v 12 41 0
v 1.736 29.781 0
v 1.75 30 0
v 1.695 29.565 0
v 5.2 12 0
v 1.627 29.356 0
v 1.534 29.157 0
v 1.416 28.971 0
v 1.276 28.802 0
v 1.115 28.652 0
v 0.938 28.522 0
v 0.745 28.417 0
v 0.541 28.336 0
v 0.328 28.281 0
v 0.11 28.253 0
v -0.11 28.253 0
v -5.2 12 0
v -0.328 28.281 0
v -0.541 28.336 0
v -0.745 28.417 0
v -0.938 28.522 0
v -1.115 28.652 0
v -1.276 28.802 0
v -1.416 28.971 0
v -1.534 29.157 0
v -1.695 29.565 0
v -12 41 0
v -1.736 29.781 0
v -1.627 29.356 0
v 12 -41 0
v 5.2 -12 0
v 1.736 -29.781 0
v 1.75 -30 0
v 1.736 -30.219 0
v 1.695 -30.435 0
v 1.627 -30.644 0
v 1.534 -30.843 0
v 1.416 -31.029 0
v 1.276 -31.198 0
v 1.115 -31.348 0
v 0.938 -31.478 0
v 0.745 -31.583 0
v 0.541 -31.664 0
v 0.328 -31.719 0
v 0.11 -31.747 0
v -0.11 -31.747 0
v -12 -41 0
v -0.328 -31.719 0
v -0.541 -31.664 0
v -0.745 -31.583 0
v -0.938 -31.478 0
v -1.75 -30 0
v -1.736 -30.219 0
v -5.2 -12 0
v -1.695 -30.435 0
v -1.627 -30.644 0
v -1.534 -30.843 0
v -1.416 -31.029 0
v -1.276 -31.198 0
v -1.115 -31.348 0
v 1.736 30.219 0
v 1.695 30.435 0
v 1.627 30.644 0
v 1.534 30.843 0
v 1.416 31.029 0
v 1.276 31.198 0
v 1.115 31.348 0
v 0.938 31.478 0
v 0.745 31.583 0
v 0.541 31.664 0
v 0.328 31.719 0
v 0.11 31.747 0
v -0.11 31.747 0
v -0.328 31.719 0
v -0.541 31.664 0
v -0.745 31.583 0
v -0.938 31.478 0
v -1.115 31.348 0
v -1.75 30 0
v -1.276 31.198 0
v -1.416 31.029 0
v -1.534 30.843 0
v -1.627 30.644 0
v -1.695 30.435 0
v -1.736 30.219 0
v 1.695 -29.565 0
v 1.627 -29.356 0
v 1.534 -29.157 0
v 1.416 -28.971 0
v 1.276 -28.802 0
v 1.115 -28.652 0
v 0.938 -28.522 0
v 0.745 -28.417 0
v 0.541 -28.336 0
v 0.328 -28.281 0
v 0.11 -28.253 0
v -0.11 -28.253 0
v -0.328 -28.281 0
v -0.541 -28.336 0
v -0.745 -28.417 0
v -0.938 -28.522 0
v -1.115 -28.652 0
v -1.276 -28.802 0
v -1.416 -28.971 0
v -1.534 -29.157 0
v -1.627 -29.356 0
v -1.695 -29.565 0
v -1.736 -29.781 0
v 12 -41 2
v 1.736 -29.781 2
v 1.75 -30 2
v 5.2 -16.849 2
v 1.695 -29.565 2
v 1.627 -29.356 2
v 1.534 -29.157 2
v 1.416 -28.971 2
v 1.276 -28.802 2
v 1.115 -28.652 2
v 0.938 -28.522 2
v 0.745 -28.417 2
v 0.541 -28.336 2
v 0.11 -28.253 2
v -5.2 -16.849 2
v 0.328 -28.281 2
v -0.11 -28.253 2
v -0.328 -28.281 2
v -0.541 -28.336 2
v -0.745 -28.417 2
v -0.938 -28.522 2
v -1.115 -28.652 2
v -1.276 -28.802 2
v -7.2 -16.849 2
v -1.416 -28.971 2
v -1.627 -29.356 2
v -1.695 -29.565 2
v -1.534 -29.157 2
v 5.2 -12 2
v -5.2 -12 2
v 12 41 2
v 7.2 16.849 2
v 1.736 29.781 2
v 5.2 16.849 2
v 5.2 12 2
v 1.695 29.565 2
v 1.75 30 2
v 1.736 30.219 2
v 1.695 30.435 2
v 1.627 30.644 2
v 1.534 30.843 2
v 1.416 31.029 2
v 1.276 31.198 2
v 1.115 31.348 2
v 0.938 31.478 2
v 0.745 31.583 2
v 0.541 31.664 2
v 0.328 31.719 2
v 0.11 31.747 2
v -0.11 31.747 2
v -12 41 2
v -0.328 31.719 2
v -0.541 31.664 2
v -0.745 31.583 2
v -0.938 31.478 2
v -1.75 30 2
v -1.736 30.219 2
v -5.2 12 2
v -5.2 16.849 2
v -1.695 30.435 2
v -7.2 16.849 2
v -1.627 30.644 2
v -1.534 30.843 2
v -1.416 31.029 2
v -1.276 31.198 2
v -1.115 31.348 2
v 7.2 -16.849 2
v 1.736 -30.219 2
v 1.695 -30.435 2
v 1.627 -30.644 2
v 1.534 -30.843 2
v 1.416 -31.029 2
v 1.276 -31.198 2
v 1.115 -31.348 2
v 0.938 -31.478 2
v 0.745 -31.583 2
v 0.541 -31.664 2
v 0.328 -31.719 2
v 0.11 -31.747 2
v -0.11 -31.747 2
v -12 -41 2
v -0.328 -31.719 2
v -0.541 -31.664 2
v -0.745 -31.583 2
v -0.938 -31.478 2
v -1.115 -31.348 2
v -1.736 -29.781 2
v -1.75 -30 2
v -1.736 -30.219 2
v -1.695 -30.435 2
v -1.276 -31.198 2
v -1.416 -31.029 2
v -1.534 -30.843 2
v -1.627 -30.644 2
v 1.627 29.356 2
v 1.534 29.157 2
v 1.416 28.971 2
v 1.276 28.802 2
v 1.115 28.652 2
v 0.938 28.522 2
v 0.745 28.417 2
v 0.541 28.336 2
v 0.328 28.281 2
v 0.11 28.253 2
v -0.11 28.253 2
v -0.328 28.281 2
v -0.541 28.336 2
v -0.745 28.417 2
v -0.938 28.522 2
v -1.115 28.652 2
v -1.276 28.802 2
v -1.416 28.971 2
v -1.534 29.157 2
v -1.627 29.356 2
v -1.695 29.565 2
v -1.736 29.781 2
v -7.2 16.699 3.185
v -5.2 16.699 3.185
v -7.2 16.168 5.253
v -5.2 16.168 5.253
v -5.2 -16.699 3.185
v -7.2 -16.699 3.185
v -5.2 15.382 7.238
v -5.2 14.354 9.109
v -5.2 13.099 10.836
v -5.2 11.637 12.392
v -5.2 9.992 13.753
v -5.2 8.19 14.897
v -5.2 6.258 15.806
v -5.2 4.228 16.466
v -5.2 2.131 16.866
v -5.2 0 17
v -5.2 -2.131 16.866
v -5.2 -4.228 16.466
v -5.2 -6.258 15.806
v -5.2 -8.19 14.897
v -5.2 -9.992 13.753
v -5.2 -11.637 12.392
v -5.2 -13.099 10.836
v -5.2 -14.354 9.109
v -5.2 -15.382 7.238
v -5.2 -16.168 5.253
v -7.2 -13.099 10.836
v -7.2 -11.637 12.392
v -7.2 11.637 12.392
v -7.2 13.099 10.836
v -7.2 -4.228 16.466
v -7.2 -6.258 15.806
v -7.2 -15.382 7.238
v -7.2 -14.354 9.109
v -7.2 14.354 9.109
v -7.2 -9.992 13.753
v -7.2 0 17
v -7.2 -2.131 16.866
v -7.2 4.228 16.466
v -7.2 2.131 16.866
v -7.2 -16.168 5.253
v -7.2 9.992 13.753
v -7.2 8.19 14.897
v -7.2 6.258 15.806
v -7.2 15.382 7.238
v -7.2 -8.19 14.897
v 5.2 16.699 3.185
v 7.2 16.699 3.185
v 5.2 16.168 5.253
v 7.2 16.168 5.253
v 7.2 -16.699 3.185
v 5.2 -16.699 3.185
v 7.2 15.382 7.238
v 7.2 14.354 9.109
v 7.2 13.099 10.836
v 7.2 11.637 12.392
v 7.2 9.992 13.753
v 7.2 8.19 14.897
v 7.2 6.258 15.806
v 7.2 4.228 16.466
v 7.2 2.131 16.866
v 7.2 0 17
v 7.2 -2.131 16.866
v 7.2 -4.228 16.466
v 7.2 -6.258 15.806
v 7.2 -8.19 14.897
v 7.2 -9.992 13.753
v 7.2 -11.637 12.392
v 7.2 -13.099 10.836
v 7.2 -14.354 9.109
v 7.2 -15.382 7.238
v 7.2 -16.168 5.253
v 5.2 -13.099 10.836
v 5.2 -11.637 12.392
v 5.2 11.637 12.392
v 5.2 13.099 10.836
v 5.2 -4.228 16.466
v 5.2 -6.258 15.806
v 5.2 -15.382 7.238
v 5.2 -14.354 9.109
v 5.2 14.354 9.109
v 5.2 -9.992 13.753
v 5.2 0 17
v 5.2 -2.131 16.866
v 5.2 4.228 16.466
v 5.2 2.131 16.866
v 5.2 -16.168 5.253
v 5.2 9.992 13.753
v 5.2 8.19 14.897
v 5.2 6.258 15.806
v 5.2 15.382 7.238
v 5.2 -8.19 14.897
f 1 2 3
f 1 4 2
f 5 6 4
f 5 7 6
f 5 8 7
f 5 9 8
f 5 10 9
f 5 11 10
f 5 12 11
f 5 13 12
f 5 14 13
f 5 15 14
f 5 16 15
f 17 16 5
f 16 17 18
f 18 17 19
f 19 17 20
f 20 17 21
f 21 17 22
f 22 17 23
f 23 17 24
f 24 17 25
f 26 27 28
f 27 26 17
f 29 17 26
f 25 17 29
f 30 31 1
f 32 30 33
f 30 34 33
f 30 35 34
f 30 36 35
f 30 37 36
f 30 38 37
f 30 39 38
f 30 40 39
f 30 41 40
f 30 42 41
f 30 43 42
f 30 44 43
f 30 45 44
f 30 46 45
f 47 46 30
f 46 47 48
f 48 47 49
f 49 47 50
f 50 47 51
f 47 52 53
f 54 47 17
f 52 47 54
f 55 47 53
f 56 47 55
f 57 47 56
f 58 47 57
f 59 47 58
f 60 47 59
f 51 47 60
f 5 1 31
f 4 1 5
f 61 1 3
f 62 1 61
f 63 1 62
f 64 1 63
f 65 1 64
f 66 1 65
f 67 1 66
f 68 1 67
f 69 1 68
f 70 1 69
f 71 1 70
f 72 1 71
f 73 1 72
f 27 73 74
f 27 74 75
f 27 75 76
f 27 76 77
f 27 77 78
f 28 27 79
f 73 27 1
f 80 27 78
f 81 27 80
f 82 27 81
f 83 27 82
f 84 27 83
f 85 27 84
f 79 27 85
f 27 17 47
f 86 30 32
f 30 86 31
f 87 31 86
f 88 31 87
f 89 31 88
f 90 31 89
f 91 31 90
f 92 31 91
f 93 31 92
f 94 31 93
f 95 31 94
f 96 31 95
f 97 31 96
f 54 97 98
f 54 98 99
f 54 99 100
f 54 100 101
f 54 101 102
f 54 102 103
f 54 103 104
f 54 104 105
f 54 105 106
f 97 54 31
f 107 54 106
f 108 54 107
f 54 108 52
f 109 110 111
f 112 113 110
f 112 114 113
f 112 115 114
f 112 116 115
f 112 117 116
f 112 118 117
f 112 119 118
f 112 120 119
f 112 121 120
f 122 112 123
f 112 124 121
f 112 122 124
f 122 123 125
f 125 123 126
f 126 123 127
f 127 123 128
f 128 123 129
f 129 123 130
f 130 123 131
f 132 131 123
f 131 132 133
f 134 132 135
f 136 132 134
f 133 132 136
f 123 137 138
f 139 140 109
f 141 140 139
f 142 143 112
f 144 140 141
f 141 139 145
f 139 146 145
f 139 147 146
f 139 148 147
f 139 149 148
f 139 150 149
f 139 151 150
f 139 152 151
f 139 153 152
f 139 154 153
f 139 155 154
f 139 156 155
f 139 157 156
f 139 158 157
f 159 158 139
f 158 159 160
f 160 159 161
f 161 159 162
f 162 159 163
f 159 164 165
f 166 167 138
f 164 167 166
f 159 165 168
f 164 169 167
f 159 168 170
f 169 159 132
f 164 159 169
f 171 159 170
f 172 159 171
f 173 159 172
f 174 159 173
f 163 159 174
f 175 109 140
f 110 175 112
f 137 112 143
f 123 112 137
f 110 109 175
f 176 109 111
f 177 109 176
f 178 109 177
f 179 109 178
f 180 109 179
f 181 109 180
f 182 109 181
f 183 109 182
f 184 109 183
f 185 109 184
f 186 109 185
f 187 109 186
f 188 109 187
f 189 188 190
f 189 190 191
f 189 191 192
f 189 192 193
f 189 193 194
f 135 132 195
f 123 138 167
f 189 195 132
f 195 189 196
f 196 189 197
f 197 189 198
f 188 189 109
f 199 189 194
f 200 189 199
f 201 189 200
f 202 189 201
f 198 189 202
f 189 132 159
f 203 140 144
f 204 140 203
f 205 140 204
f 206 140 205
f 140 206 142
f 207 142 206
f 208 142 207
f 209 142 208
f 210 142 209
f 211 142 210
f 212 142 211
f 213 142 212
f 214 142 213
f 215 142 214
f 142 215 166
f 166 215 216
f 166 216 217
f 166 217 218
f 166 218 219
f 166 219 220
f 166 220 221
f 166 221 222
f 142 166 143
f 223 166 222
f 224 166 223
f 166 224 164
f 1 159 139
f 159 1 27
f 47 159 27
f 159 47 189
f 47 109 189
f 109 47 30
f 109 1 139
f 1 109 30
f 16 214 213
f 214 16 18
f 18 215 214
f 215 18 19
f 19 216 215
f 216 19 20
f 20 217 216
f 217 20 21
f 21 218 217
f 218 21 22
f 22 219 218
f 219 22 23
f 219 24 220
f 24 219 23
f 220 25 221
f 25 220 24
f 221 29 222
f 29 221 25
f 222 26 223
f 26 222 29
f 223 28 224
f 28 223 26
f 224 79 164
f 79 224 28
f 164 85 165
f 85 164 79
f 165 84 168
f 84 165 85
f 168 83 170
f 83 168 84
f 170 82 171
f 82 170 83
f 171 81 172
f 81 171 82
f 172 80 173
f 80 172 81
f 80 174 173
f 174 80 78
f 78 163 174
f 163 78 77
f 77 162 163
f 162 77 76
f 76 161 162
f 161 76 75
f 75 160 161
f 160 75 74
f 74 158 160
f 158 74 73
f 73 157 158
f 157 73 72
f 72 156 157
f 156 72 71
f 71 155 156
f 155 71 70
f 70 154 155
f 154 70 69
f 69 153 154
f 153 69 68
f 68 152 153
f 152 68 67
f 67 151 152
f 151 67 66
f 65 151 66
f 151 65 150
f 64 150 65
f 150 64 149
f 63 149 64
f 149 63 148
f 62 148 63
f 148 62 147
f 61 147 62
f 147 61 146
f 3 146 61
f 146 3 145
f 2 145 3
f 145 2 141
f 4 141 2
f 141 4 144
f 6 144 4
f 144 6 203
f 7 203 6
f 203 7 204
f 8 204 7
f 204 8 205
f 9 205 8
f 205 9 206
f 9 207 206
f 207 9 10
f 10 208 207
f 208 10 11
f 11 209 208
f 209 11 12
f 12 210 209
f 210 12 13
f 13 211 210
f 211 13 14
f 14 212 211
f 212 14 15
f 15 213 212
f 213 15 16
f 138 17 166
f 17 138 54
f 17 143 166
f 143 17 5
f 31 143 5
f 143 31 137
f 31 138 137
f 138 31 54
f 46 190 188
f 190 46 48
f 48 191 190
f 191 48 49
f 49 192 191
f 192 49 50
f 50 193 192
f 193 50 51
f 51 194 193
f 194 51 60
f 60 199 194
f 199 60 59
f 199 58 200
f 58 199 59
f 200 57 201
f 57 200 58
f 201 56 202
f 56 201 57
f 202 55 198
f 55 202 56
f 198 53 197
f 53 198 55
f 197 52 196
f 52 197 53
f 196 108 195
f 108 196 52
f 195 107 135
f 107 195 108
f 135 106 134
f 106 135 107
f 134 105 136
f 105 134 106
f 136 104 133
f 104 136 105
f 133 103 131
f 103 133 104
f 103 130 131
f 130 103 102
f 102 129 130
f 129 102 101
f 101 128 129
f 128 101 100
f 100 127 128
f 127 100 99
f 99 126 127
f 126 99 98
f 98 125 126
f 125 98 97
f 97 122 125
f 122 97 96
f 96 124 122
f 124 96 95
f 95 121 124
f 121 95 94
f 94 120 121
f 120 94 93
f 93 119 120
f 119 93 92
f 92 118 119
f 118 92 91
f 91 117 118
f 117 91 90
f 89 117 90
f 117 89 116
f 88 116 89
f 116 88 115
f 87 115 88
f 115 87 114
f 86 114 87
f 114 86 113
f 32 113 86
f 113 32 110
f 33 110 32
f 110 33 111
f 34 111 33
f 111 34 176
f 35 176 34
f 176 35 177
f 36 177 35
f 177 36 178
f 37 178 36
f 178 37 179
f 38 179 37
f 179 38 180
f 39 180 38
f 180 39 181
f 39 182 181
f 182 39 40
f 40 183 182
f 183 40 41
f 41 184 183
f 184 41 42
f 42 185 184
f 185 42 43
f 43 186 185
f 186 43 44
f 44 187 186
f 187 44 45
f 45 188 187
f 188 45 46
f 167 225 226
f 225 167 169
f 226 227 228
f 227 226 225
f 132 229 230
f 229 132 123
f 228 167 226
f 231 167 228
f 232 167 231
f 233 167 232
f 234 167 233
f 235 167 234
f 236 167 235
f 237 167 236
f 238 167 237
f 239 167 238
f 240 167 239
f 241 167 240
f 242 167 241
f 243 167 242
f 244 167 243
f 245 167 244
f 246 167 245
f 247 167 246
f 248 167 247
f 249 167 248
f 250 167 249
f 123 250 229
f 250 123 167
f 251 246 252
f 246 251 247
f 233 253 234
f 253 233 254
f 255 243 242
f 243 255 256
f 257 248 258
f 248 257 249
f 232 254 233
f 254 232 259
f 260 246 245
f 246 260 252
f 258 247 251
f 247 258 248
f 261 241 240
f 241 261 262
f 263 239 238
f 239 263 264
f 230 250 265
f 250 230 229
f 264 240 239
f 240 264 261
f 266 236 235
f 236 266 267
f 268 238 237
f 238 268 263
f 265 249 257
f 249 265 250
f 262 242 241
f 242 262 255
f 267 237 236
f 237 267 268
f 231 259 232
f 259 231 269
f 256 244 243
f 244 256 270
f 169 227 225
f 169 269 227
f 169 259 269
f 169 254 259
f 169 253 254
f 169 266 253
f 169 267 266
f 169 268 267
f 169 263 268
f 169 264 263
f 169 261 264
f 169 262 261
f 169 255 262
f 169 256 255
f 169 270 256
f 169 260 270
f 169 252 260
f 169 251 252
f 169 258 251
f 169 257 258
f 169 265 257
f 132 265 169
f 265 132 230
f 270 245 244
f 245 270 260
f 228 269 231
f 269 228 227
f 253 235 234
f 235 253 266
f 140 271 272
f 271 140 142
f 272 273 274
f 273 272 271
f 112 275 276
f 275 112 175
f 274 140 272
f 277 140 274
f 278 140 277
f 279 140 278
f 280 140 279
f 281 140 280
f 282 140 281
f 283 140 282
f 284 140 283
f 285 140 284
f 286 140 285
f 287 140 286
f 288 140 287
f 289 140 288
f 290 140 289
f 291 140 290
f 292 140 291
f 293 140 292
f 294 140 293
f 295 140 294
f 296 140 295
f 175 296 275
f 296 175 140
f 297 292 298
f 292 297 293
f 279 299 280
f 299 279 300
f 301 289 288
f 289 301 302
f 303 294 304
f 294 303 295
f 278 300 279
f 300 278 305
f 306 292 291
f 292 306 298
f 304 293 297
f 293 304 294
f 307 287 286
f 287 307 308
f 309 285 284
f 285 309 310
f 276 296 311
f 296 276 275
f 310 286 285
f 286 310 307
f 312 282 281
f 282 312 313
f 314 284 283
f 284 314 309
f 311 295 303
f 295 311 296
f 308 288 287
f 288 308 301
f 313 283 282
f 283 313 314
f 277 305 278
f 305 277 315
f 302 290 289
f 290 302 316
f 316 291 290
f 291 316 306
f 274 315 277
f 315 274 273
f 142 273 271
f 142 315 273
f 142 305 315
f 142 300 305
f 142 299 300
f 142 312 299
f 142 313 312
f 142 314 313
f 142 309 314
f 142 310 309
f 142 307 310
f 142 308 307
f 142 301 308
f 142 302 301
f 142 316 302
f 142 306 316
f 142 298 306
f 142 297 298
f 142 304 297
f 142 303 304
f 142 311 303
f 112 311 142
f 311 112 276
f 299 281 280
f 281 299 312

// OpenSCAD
// light cover blocker

width=24;
height=82;
thick=2;
screw_spacing=60;
screw_hole_diameter=3.5;

module lightcover() {
  $fn=50;
  switch_hole_width=10.4;
  switch_hole_height=24;
  guard_radius=17;
 
  linear_extrude(thick) 
    plate_sketch();   
  
  translate([-switch_hole_width/2-thick,0,0])    
    rotate([0,90,0])
      linear_extrude(thick)
        guard_sketch();   
  
  translate([switch_hole_width/2,0,0])    
    rotate([0,90,0])
      linear_extrude(thick)
        guard_sketch();   
  
  module plate_sketch() {
    difference() {
    square([width,height], true);
    square([switch_hole_width,
      switch_hole_height], true);
    translate([0,screw_spacing/2,0])
      circle(d=screw_hole_diameter);
    translate([0,-screw_spacing/2,0])
      circle(d=screw_hole_diameter);
    }     
  }
 
  module guard_sketch() {        
    difference() {
      circle(guard_radius);
      translate([0,-50,0])
        square([100,100], false);
    }
 
  }
}

lightcover();
